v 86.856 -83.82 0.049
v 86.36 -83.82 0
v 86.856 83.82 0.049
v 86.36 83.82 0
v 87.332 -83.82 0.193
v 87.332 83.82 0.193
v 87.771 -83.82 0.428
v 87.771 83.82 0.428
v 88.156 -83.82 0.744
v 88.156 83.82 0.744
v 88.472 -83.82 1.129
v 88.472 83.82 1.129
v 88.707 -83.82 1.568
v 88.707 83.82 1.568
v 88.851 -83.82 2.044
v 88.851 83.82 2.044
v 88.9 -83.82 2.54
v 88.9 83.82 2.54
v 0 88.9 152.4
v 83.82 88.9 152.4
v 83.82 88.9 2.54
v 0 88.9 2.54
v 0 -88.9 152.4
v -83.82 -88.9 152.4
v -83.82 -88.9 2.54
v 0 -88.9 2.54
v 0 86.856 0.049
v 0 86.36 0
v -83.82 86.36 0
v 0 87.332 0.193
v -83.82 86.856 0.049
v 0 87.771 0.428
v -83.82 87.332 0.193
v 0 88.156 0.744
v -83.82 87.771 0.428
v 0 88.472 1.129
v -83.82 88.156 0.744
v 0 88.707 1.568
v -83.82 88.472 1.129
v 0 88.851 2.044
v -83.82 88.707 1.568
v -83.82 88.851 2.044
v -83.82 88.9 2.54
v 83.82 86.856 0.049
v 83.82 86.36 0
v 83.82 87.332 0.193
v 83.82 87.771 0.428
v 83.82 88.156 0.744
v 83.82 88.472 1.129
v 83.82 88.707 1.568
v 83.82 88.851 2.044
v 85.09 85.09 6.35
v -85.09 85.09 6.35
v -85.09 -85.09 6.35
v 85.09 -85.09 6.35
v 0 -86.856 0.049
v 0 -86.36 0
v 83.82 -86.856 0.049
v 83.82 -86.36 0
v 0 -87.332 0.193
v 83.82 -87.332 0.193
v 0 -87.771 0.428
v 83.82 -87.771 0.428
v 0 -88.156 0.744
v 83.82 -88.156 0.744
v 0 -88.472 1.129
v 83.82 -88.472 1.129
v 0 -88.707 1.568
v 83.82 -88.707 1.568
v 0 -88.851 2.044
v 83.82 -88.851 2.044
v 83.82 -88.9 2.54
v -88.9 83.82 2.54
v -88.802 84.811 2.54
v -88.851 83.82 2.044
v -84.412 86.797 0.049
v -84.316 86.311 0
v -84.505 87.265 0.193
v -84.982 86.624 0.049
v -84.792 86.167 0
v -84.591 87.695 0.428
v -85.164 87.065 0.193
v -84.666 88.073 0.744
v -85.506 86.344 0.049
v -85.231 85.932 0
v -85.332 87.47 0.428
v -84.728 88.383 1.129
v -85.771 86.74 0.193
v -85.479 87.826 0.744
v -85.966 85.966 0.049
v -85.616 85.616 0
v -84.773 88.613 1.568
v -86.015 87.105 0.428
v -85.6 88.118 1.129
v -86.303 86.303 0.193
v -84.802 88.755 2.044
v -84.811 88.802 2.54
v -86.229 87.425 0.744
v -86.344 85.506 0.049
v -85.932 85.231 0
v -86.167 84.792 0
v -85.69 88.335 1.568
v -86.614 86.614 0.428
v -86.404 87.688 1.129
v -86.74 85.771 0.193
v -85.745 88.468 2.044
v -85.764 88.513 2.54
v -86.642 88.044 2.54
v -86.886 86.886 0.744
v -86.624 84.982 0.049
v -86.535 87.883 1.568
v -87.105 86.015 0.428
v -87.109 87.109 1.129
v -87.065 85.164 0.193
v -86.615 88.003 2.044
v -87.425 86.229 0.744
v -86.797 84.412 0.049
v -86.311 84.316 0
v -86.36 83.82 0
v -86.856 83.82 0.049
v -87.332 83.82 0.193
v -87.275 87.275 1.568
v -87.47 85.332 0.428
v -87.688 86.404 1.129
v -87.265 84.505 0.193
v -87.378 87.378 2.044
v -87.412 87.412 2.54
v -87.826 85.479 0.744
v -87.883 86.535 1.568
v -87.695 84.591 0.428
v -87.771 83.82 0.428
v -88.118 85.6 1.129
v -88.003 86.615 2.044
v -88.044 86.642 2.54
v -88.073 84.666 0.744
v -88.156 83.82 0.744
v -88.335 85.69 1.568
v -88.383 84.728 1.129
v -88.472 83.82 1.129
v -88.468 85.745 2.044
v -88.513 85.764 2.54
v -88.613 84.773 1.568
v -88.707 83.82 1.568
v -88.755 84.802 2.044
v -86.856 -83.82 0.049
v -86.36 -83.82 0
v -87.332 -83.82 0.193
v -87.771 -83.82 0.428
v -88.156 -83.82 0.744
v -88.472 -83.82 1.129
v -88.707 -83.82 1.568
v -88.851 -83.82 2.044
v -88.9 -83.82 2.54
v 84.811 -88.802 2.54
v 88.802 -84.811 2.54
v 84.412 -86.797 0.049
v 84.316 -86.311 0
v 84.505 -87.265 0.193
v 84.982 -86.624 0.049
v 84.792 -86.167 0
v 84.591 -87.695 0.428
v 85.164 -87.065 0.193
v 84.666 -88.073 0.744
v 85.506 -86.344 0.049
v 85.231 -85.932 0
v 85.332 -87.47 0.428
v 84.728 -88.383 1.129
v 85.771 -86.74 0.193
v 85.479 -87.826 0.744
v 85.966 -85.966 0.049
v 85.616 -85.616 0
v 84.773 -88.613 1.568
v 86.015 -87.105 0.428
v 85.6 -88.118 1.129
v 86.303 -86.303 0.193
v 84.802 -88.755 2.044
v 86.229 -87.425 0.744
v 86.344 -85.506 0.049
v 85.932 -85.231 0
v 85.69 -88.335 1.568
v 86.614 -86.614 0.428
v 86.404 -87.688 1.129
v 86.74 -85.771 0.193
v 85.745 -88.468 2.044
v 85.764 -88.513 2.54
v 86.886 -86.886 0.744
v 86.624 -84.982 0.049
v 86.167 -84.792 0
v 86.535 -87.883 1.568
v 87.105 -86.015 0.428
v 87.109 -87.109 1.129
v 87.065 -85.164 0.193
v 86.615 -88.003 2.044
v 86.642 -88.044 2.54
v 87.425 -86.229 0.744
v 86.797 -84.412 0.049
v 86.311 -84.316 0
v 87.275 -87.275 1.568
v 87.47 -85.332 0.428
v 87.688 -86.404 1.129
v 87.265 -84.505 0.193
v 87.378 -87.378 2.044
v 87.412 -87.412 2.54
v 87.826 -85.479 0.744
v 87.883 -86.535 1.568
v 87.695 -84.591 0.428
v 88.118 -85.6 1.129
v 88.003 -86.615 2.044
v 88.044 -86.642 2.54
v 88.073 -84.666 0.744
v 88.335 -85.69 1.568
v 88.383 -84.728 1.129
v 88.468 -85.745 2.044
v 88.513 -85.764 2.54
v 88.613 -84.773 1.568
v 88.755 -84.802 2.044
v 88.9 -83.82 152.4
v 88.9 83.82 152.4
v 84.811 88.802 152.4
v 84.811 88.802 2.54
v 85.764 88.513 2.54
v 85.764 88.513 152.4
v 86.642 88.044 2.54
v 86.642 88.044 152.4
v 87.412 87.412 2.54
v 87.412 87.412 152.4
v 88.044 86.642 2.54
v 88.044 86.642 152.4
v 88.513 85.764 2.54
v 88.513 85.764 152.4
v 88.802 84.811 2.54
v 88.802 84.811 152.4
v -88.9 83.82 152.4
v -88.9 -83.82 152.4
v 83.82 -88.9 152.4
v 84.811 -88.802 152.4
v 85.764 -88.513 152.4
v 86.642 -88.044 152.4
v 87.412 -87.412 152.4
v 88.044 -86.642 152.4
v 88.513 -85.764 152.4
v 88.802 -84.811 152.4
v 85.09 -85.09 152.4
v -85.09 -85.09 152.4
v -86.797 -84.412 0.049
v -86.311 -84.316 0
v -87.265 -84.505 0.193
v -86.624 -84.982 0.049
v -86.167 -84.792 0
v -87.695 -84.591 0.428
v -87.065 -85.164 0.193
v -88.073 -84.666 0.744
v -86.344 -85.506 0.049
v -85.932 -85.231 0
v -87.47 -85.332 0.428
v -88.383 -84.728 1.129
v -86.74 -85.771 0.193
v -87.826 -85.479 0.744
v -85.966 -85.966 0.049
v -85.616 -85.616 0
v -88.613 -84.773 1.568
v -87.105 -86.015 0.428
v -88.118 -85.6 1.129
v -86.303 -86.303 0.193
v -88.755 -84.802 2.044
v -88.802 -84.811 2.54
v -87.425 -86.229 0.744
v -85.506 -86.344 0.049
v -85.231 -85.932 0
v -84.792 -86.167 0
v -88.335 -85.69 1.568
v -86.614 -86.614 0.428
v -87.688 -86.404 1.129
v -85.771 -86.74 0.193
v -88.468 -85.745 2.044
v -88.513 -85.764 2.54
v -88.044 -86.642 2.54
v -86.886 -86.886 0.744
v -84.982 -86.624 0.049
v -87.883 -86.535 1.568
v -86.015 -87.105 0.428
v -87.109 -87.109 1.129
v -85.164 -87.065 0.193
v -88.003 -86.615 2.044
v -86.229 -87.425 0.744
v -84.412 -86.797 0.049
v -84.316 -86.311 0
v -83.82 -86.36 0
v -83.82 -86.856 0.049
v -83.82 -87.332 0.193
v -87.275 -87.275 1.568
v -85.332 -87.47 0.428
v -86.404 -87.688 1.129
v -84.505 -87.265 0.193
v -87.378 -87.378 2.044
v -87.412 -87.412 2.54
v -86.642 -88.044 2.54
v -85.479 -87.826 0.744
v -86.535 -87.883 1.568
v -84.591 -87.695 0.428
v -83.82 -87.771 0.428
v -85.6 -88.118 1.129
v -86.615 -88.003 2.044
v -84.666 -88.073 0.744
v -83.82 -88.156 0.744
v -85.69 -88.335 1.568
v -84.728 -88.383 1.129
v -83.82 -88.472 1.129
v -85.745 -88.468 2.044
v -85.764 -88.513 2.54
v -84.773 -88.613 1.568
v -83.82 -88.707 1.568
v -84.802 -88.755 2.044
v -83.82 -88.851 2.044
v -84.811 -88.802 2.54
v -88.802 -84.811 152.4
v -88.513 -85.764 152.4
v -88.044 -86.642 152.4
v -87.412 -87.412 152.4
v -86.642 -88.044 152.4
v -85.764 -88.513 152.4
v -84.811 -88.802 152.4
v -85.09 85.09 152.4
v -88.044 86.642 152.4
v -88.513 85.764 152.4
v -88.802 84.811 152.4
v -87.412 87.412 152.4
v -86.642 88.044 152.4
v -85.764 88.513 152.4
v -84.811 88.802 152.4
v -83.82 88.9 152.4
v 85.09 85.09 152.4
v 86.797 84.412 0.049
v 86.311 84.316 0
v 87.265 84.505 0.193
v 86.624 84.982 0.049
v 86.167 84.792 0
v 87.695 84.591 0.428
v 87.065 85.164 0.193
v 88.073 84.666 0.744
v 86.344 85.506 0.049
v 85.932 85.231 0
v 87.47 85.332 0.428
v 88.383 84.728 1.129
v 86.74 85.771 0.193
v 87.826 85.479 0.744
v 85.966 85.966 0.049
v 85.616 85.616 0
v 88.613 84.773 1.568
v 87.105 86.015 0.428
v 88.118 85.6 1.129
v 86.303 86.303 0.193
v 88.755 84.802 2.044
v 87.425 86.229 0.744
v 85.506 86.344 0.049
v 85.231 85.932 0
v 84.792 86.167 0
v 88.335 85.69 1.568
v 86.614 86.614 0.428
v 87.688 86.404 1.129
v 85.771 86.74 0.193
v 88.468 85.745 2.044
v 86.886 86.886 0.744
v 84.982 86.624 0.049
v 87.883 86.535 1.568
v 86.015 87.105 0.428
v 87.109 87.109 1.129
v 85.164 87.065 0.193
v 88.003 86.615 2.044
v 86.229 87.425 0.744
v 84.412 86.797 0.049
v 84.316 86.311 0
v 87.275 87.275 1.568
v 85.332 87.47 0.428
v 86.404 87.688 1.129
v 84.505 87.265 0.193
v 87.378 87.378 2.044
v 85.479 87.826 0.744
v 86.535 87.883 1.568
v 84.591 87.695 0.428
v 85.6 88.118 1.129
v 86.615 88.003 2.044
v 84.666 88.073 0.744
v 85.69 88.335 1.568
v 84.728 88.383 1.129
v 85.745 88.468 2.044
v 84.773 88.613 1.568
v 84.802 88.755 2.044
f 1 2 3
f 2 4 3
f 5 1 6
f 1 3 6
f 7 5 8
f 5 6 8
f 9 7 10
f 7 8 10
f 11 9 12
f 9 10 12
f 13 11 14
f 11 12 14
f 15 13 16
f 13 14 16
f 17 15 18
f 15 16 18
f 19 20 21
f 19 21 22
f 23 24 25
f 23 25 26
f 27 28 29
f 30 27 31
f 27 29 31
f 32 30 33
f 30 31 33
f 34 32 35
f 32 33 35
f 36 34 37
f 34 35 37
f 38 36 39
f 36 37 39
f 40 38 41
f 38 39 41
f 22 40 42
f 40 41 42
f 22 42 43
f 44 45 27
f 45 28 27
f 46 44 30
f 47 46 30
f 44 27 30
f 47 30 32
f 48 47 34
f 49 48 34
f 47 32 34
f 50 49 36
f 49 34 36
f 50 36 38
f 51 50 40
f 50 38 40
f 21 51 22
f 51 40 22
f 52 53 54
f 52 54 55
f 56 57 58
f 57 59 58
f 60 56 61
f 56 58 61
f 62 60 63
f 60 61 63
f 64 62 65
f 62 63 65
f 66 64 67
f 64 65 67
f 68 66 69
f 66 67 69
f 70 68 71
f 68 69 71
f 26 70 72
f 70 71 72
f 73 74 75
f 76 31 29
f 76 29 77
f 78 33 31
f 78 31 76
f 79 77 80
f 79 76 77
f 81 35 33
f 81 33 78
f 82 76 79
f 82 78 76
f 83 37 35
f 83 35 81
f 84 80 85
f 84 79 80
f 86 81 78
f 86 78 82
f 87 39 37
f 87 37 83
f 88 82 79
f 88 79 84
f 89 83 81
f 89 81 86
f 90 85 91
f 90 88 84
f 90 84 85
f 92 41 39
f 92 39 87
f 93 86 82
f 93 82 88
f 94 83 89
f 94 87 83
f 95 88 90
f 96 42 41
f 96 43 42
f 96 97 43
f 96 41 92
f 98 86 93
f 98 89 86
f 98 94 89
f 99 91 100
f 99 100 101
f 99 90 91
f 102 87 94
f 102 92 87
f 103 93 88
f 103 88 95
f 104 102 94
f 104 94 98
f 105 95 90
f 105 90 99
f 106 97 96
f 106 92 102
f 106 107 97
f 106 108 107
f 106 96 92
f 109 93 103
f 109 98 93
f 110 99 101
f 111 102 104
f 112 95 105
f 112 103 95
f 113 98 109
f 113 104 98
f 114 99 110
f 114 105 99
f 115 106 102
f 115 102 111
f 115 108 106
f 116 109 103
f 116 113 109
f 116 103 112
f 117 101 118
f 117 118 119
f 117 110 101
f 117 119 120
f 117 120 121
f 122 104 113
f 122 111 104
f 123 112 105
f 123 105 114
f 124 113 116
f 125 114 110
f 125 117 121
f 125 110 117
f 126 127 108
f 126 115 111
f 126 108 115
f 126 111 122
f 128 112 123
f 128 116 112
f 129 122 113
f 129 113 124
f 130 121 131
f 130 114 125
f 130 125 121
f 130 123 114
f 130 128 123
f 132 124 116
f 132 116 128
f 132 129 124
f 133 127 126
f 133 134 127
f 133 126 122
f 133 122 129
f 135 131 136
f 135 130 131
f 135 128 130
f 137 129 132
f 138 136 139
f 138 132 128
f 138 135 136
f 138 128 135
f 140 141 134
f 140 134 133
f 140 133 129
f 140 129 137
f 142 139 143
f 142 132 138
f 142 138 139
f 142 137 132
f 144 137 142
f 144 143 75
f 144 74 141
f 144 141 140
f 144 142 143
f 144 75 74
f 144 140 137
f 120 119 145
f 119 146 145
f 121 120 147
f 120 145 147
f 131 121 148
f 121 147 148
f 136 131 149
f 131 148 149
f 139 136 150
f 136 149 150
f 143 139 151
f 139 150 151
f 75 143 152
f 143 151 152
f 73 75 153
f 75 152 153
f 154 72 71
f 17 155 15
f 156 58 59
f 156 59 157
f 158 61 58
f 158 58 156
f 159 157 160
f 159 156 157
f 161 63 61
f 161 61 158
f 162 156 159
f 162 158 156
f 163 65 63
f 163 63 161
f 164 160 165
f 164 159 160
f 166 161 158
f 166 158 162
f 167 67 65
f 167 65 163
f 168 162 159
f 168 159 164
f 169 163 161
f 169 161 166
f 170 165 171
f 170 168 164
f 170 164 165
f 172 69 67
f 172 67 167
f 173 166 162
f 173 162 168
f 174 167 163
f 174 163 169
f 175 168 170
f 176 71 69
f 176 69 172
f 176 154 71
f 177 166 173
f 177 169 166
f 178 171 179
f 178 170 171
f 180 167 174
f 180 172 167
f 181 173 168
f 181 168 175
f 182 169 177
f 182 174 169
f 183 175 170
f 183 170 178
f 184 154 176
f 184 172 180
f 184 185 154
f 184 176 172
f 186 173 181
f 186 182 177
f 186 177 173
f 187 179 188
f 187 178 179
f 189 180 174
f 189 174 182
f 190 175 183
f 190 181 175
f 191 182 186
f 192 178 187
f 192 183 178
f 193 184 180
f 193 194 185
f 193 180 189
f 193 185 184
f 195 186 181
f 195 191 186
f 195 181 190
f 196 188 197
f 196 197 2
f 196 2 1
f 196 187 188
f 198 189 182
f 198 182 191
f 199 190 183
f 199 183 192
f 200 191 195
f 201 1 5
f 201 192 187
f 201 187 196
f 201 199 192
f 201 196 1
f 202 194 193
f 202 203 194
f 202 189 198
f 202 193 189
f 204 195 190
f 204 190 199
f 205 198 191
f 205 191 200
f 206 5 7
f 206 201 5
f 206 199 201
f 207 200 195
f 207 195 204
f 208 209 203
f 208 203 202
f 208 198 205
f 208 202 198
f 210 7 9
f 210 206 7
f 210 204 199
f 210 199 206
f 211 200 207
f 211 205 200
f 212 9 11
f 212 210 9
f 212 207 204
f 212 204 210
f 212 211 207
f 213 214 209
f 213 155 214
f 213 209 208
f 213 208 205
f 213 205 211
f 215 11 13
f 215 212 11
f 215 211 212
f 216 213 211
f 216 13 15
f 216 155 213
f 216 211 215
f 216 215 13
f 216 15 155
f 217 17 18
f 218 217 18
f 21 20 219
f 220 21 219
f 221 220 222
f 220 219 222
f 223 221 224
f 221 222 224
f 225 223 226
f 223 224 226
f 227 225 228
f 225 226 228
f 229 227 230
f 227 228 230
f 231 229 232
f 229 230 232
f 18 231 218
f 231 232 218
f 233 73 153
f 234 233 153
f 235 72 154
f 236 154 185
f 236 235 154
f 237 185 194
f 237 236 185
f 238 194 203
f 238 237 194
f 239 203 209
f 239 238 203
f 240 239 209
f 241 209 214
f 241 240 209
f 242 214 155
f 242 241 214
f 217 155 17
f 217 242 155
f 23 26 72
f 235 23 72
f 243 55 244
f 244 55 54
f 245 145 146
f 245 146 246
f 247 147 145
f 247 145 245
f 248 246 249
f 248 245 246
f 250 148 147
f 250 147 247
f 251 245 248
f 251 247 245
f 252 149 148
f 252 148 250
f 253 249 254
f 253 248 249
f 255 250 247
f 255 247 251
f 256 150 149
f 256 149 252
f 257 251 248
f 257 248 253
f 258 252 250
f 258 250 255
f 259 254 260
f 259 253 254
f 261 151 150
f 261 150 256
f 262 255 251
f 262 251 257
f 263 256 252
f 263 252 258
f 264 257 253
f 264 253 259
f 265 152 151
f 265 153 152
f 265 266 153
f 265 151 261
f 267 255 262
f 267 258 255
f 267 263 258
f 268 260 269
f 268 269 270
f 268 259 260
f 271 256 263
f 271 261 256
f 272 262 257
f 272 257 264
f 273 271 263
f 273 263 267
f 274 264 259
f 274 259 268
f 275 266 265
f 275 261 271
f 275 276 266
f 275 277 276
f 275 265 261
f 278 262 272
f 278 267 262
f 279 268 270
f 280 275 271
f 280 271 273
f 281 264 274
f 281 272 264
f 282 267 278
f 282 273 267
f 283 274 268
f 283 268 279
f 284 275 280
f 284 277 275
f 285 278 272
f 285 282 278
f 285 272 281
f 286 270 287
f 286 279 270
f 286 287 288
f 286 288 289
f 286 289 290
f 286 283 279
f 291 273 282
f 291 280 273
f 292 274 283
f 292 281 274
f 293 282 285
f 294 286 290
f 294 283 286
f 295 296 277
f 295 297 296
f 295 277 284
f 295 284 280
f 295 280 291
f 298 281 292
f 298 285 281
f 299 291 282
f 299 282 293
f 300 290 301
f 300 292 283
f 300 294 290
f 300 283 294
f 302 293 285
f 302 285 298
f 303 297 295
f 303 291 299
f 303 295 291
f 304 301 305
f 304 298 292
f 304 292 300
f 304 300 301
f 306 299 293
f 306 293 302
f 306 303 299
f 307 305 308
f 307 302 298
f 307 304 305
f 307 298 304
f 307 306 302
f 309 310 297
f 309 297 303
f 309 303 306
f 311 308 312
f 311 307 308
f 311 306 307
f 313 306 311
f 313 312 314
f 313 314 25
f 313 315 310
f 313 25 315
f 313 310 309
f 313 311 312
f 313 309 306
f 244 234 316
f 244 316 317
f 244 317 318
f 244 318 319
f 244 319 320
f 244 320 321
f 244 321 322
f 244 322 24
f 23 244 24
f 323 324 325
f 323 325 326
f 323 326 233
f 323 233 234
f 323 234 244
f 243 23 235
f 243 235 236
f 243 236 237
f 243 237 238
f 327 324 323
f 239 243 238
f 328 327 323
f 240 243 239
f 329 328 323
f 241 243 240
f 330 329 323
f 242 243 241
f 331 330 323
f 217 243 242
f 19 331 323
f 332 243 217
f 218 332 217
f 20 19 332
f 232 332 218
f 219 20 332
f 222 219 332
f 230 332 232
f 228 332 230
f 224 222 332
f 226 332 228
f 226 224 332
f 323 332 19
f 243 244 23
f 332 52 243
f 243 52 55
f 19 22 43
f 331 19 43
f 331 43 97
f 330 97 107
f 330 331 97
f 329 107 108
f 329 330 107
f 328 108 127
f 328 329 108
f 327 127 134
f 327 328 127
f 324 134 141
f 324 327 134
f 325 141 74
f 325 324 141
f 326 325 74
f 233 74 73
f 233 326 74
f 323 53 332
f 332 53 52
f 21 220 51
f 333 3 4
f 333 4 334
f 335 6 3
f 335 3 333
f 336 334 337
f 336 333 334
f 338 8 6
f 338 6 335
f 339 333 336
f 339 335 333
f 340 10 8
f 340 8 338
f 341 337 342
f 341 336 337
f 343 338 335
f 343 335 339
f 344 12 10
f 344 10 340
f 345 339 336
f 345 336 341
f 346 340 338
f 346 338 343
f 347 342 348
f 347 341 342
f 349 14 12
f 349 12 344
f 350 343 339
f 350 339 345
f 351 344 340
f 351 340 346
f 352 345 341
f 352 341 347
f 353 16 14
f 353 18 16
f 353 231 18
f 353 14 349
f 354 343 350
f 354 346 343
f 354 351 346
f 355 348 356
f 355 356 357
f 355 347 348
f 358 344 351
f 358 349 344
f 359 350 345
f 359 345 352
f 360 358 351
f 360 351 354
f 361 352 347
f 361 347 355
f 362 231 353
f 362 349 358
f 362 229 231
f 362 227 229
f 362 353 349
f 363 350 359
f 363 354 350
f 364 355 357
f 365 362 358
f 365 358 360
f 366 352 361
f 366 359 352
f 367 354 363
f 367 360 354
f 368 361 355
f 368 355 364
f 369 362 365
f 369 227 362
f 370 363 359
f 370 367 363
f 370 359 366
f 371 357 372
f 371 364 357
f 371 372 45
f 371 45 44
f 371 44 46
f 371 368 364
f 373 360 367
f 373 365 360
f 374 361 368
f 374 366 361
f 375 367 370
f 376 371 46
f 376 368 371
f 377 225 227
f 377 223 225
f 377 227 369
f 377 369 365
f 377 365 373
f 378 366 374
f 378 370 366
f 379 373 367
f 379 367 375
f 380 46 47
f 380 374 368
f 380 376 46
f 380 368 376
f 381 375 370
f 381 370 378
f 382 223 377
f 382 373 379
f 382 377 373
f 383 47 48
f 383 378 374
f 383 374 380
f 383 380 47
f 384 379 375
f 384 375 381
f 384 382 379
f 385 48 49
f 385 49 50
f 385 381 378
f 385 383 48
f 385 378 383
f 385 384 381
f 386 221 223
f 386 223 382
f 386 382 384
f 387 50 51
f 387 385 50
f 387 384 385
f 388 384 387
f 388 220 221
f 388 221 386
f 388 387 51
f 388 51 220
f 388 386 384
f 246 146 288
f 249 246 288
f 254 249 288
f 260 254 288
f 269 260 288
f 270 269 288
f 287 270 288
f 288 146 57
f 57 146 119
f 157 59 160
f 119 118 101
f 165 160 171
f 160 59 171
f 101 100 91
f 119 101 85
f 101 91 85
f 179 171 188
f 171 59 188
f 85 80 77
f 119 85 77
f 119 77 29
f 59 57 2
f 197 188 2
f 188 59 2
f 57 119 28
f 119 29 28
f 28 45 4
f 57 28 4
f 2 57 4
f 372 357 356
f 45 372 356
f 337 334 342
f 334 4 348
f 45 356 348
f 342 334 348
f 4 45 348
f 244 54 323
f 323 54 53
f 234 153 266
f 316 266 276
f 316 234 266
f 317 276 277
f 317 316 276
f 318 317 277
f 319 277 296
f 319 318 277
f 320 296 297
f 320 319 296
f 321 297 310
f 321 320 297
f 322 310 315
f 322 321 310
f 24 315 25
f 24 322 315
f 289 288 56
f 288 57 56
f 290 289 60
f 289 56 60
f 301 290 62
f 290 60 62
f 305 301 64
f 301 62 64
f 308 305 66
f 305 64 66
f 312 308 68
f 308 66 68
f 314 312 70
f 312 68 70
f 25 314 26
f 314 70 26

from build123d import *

# Parameters (mm, degrees)
F1_DEPTH = 152.4
F2_DEPTH = 6.35
F4_R     = 5.08
F5_R     = 2.54


# Not quite as in the source:
# - ends of sketch curves that miss each other by under 0.0002 mm in the source are joined


with BuildPart() as f1:
    # F0 (on Top) → F1 (new body)
    with BuildSketch(Plane.XY):
        Polygon((88.9, 1.431e-07), (88.9, 88.9), (0, 88.9), (0, 85.09), (85.09, 85.09), (85.09, 1.431e-07), align=None)
        Polygon((0, 85.09), (0, 88.9000001431), (-88.9, 88.9), (-88.9, 1.431e-07), (-85.09, 1.431e-07), (-85.09, 85.09), align=None)
        Polygon((-85.09, 1.431e-07), (-88.9, 1.431e-07), (-88.9, -88.9), (0, -88.9), (0, -85.09), (-85.09, -85.09), align=None)
        Polygon((88.9, -88.9), (88.9, 1.431e-07), (85.09, 1.431e-07), (85.09, -85.09), (0, -85.09), (0, -88.8999998569), align=None)
    extrude(amount=F1_DEPTH)

    # F0 (on Top) → F2 (join)
    with BuildSketch(Plane.XY):
        Polygon((85.09, -85.09), (85.09, 1.431e-07), (57.15, 1.431e-07), (44.45, 1.431e-07), (31.75, 1.431e-07), (0, 1.431e-07), (0, -31.7499998569), (10.16, -26.6699998569), (10.16, -44.4499998569), (10.16, -62.2299998569), (0, -57.1499998569), (0, -85.09), align=None)
        Polygon((0, 57.1500001431), (0, 85.09), (-85.09, 85.09), (-85.09, 1.431e-07), (-57.15, 1.431e-07), (-44.45, 1.431e-07), (-31.75, 1.431e-07), (0, 1.431e-07), (0, 31.7500001431), (-10.16, 26.6700001431), (-10.16, 44.4500001431), (-10.16, 62.2300001431), align=None)
        Polygon((44.45, 1.431e-07), (57.15, 1.431e-07), (62.23, 10.1600001431), (44.45, 10.1600001431), align=None)
        Polygon((31.75, 1.431e-07), (44.45, 1.431e-07), (44.45, 10.1600001431), (26.67, 10.1600001431), align=None)
        Polygon((0, 31.7500001431), (0, 44.4500001431), (-10.16, 44.4500001431), (-10.16, 26.6700001431), align=None)
        Polygon((0, 44.4500001431), (0, 57.1500001431), (-10.16, 62.2300001431), (-10.16, 44.4500001431), align=None)
        Polygon((85.09, 85.09), (0, 85.09), (0, 57.1500001431), (0, 44.4500001431), (0, 31.7500001431), (0, 1.431e-07), (31.75, 1.431e-07), (26.67, 10.1600001431), (44.45, 10.1600001431), (62.23, 10.1600001431), (57.15, 1.431e-07), (85.09, 1.431e-07), align=None)
        Polygon((-57.15, 1.431e-07), (-85.09, 1.431e-07), (-85.09, -85.09), (0, -85.09), (0, -57.1499998569), (0, -44.4499998569), (0, -31.7499998569), (0, 1.431e-07), (-31.75, 1.431e-07), (-26.67, -10.1599998569), (-44.45, -10.1599998569), (-62.23, -10.1599998569), align=None)
        Polygon((0, -31.7499998569), (0, -44.4499998569), (10.16, -44.4499998569), (10.16, -26.6699998569), align=None)
        Polygon((0, -44.4499998569), (0, -57.1499998569), (10.16, -62.2299998569), (10.16, -44.4499998569), align=None)
        Polygon((-31.75, 1.431e-07), (-44.45, 1.431e-07), (-44.45, -10.1599998569), (-26.67, -10.1599998569), align=None)
        Polygon((-44.45, 1.431e-07), (-57.15, 1.431e-07), (-62.23, -10.1599998569), (-44.45, -10.1599998569), align=None)
    extrude(amount=F2_DEPTH)

    # F4
    f4_edges = [f1.edges().sort_by_distance(p)[0] for p in [
        (-88.9, 88.9, 76.2),
        (88.9, 88.9, 76.2),
        (88.9, -88.9, 76.2),
        (-88.9, -88.9, 76.2),
    ]]
    fillet(f4_edges, radius=F4_R)

    # F5
    f5_edges = [f1.edges().sort_by_distance(p)[0] for p in [
        (41.91, 88.9, 0),
        (87.412102, 87.412102, 0),
        (-41.91, 88.9, 0),
        (88.9, 0, 0),
        (-87.412102, 87.412102, 0),
        (87.412102, -87.412102, 0),
        (-88.9, 0, 0),
        (41.91, -88.9, 0),
        (-87.412102, -87.412102, 0),
        (-41.91, -88.9, 0),
    ]]
    fillet(f5_edges, radius=F5_R)


solid = f1.part
